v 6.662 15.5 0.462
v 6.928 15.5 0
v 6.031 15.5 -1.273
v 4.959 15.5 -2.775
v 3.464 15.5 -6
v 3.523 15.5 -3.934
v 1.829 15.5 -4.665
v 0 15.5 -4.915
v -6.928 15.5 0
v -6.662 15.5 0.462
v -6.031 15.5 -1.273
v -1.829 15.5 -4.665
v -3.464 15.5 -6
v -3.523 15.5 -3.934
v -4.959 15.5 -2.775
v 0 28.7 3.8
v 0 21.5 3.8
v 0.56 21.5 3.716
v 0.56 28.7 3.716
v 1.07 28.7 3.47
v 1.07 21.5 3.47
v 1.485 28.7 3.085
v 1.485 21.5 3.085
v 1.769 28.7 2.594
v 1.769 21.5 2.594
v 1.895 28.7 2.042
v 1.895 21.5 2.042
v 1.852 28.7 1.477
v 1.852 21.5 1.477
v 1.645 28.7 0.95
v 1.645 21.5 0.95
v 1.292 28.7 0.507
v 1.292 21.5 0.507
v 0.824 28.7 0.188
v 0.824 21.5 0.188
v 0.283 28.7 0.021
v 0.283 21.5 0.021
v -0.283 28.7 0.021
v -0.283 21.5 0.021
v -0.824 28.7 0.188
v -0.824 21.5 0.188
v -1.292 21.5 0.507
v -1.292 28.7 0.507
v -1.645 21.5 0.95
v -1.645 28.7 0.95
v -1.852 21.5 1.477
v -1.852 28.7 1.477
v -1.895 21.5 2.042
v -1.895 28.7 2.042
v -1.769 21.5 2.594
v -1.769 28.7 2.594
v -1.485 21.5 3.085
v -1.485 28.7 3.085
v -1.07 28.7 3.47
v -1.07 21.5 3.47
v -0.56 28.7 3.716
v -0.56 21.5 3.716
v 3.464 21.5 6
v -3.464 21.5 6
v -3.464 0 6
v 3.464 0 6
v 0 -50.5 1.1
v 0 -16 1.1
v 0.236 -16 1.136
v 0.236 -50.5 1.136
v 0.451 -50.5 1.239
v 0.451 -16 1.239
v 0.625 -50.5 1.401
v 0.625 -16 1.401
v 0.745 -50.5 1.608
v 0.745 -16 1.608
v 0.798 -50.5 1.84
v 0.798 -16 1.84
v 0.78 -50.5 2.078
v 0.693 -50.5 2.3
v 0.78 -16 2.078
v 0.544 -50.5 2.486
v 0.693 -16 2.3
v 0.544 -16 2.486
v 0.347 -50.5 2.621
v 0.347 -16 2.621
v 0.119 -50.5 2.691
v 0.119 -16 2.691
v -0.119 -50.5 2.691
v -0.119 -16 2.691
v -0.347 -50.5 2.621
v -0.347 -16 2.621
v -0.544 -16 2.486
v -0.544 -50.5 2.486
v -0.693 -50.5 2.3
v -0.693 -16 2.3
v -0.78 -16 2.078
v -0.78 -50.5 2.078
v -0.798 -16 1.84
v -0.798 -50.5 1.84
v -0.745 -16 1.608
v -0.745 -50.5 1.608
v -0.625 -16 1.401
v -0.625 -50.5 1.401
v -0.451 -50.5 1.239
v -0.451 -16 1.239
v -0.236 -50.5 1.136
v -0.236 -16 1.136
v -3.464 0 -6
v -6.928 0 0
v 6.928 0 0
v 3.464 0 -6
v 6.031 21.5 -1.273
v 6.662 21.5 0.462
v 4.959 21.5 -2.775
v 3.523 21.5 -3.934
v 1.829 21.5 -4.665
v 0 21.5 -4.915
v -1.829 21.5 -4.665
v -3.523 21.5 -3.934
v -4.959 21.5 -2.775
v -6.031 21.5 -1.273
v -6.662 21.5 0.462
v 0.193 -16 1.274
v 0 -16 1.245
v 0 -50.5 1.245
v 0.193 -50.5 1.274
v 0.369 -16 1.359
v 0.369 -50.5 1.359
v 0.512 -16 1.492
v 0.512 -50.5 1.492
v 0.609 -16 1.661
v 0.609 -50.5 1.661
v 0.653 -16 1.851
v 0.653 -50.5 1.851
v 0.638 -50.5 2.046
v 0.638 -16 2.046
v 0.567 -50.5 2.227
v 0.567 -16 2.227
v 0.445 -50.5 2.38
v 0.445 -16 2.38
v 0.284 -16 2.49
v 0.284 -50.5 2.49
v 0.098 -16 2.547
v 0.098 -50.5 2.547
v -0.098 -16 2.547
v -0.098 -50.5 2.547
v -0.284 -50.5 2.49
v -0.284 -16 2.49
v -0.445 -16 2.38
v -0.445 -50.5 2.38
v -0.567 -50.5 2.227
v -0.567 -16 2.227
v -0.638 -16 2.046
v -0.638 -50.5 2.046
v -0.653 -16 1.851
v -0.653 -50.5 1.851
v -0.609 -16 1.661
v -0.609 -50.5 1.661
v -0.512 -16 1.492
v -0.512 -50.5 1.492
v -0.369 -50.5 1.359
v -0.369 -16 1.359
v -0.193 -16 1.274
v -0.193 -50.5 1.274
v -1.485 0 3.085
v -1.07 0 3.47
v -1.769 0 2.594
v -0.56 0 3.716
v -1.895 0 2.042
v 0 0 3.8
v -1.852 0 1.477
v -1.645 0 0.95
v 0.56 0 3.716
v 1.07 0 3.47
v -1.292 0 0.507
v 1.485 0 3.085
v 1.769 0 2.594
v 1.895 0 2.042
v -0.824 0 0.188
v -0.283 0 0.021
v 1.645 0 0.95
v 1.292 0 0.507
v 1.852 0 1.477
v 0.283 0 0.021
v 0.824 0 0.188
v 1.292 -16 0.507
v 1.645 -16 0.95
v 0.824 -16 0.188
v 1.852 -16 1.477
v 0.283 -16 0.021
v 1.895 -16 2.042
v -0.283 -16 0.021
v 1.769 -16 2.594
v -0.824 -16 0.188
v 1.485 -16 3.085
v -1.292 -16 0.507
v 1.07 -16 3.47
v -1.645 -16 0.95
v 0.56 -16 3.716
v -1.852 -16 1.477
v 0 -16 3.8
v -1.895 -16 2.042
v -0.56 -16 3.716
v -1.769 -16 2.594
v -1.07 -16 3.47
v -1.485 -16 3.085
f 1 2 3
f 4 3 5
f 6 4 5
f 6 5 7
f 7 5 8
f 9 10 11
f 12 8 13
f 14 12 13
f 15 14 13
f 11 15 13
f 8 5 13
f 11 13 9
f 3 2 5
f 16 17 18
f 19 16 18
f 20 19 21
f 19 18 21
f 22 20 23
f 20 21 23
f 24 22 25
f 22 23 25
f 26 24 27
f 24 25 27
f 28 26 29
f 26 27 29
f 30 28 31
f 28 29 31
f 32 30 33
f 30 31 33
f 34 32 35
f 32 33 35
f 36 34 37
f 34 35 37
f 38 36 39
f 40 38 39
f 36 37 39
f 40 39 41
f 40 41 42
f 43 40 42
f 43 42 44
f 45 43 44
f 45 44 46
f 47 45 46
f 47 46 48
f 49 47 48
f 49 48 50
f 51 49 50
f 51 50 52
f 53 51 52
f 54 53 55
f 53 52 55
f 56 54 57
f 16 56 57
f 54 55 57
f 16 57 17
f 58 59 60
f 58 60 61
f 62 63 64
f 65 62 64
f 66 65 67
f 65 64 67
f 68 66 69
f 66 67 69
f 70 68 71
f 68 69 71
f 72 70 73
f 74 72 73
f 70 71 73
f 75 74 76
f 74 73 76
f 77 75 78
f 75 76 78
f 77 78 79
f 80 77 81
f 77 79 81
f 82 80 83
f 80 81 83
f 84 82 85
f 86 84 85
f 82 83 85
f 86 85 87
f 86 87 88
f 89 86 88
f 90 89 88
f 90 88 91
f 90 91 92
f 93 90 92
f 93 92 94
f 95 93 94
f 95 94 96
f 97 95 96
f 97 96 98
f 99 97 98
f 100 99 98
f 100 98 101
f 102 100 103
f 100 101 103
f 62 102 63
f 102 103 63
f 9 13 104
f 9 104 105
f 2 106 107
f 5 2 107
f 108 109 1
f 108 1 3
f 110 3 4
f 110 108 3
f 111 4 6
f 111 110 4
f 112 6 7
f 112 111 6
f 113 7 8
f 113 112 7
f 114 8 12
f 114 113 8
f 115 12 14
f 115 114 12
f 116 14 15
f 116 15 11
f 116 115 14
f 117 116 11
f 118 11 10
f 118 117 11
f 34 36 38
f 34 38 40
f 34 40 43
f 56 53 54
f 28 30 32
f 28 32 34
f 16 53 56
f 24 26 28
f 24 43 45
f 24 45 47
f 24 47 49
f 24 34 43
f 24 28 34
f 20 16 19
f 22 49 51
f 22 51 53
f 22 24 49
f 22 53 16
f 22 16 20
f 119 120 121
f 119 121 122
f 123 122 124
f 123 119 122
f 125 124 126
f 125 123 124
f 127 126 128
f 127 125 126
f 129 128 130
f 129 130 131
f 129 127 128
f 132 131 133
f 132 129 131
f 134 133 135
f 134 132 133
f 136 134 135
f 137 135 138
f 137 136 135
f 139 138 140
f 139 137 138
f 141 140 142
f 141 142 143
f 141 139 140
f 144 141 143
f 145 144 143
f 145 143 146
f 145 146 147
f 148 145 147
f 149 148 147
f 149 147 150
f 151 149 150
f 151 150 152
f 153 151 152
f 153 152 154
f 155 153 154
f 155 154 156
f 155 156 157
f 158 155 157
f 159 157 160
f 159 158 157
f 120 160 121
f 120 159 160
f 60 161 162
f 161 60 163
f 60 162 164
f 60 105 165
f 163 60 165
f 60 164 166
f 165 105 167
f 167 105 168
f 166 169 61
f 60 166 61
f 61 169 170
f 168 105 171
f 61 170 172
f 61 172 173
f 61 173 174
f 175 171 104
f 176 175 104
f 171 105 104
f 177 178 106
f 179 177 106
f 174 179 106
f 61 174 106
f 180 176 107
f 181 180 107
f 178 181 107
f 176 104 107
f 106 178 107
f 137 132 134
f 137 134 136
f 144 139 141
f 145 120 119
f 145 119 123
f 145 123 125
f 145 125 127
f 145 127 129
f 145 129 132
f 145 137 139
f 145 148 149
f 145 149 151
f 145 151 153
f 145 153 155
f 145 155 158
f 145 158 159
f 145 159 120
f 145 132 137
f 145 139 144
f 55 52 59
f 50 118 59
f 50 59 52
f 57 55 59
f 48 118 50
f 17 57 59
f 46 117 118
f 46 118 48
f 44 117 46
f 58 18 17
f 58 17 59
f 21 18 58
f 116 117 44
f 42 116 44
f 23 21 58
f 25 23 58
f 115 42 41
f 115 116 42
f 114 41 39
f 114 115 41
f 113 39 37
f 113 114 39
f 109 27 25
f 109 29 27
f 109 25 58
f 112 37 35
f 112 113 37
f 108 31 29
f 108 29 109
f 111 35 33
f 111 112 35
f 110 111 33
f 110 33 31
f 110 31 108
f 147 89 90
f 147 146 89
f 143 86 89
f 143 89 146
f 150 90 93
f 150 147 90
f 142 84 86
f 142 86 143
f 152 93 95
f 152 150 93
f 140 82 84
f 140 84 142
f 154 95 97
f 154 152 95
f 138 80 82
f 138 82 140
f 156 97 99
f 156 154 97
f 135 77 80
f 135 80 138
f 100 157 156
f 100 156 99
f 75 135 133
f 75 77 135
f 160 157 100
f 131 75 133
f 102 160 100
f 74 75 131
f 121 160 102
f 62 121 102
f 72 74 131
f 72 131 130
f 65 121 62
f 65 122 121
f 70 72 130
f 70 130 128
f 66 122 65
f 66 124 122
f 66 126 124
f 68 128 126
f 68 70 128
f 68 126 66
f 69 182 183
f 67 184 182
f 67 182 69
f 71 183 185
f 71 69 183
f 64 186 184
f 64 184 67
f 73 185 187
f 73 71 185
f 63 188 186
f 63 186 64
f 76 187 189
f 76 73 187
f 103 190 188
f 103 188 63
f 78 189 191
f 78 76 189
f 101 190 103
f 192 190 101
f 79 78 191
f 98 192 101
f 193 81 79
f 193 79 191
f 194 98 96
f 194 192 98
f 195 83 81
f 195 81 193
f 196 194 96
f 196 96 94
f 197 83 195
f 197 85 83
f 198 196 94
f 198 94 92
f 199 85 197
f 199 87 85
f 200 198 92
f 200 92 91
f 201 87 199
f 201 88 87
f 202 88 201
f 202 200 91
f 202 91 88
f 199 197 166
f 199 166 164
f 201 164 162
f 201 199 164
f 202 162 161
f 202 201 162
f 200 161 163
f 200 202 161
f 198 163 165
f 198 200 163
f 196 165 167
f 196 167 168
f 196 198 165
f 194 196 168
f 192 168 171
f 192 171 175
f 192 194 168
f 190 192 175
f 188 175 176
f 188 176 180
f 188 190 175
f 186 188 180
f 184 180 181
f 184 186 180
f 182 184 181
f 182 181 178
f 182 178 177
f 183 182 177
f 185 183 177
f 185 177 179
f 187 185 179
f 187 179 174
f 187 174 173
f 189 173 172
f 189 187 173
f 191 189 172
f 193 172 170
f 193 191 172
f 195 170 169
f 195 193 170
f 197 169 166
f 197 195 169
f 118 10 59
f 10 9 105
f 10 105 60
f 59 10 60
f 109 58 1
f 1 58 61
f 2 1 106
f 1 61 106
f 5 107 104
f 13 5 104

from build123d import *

# Parameters (mm, degrees)
BOSS_EXTRUDE1_DEPTH = 21.5
SKETCH2_R           = 1.9
BOSS_EXTRUDE2_DEPTH = 7.2
CUT_EXTRUDE1_DEPTH  = 6
BOSS_EXTRUDE3_START = 16
SKETCH4_R           = 1.9
BOSS_EXTRUDE3_DEPTH = 16
SKETCH5_R           = 0.8
SKETCH5_R_2         = 0.654757234
BOSS_EXTRUDE4_DEPTH = 34.5


with BuildPart() as part:
    # Sketch1 → Boss-Extrude1 (new body)
    with BuildSketch(Plane(origin=(0, 0, 0), x_dir=(1, 0, 0), z_dir=(0, 1, 0))):
        Polygon((-6.92820323, 0), (-3.464101615, -6), (3.464101615, -6), (6.92820323, 0), (3.464101615, 6), (-3.464101615, 6), align=None)
    extrude(amount=BOSS_EXTRUDE1_DEPTH)

    # Sketch2 → Boss-Extrude2 (add)
    with BuildSketch(Plane(origin=(0, 21.5, 0), x_dir=(1, 0, 0), z_dir=(0, 1, 0))):
        with Locations(Location((0, -1.9, 0), (0, 0, 270))):
            Circle(SKETCH2_R)
    extrude(amount=BOSS_EXTRUDE2_DEPTH)

    # Sketch3 → Cut-Extrude1 (cut)
    with BuildSketch(Plane(origin=(0, 21.5, 0), x_dir=(1, 0, 0), z_dir=(0, 1, 0))):
        with BuildLine():
            Line((-6.661546125, -0.461863655), (-6.92820323, 0))
            Line((-6.92820323, 0), (-3.464101615, 6))
            Line((-3.464101615, 6), (3.464101615, 6))
            Line((3.464101615, 6), (6.92820323, 0))
            Line((6.92820323, 0), (6.661546125, -0.461863655))
            ThreePointArc((6.661546125, -0.461863655), (0, 4.915015255), (-6.661546125, -0.461863655))
        make_face()
    extrude(amount=-CUT_EXTRUDE1_DEPTH, mode=Mode.SUBTRACT)

    # Sketch4 → Boss-Extrude3 (add)
    with BuildSketch(Plane.XZ.offset(BOSS_EXTRUDE3_START)):
        with Locations(Location((0, 1.9, 0), (0, 0, 90))):
            Circle(SKETCH4_R)
    extrude(amount=-BOSS_EXTRUDE3_DEPTH)

    # Sketch5 → Boss-Extrude4 (add)
    with BuildSketch(Plane.XZ.offset(16)):
        with Locations(Location((0, 1.9, 0), (0, 0, 270))):
            Circle(SKETCH5_R)
        with Locations(Location((0, 1.9, 0), (0, 0, 270))):
            Circle(SKETCH5_R_2, mode=Mode.SUBTRACT)
    extrude(amount=BOSS_EXTRUDE4_DEPTH)


solid = part.part
